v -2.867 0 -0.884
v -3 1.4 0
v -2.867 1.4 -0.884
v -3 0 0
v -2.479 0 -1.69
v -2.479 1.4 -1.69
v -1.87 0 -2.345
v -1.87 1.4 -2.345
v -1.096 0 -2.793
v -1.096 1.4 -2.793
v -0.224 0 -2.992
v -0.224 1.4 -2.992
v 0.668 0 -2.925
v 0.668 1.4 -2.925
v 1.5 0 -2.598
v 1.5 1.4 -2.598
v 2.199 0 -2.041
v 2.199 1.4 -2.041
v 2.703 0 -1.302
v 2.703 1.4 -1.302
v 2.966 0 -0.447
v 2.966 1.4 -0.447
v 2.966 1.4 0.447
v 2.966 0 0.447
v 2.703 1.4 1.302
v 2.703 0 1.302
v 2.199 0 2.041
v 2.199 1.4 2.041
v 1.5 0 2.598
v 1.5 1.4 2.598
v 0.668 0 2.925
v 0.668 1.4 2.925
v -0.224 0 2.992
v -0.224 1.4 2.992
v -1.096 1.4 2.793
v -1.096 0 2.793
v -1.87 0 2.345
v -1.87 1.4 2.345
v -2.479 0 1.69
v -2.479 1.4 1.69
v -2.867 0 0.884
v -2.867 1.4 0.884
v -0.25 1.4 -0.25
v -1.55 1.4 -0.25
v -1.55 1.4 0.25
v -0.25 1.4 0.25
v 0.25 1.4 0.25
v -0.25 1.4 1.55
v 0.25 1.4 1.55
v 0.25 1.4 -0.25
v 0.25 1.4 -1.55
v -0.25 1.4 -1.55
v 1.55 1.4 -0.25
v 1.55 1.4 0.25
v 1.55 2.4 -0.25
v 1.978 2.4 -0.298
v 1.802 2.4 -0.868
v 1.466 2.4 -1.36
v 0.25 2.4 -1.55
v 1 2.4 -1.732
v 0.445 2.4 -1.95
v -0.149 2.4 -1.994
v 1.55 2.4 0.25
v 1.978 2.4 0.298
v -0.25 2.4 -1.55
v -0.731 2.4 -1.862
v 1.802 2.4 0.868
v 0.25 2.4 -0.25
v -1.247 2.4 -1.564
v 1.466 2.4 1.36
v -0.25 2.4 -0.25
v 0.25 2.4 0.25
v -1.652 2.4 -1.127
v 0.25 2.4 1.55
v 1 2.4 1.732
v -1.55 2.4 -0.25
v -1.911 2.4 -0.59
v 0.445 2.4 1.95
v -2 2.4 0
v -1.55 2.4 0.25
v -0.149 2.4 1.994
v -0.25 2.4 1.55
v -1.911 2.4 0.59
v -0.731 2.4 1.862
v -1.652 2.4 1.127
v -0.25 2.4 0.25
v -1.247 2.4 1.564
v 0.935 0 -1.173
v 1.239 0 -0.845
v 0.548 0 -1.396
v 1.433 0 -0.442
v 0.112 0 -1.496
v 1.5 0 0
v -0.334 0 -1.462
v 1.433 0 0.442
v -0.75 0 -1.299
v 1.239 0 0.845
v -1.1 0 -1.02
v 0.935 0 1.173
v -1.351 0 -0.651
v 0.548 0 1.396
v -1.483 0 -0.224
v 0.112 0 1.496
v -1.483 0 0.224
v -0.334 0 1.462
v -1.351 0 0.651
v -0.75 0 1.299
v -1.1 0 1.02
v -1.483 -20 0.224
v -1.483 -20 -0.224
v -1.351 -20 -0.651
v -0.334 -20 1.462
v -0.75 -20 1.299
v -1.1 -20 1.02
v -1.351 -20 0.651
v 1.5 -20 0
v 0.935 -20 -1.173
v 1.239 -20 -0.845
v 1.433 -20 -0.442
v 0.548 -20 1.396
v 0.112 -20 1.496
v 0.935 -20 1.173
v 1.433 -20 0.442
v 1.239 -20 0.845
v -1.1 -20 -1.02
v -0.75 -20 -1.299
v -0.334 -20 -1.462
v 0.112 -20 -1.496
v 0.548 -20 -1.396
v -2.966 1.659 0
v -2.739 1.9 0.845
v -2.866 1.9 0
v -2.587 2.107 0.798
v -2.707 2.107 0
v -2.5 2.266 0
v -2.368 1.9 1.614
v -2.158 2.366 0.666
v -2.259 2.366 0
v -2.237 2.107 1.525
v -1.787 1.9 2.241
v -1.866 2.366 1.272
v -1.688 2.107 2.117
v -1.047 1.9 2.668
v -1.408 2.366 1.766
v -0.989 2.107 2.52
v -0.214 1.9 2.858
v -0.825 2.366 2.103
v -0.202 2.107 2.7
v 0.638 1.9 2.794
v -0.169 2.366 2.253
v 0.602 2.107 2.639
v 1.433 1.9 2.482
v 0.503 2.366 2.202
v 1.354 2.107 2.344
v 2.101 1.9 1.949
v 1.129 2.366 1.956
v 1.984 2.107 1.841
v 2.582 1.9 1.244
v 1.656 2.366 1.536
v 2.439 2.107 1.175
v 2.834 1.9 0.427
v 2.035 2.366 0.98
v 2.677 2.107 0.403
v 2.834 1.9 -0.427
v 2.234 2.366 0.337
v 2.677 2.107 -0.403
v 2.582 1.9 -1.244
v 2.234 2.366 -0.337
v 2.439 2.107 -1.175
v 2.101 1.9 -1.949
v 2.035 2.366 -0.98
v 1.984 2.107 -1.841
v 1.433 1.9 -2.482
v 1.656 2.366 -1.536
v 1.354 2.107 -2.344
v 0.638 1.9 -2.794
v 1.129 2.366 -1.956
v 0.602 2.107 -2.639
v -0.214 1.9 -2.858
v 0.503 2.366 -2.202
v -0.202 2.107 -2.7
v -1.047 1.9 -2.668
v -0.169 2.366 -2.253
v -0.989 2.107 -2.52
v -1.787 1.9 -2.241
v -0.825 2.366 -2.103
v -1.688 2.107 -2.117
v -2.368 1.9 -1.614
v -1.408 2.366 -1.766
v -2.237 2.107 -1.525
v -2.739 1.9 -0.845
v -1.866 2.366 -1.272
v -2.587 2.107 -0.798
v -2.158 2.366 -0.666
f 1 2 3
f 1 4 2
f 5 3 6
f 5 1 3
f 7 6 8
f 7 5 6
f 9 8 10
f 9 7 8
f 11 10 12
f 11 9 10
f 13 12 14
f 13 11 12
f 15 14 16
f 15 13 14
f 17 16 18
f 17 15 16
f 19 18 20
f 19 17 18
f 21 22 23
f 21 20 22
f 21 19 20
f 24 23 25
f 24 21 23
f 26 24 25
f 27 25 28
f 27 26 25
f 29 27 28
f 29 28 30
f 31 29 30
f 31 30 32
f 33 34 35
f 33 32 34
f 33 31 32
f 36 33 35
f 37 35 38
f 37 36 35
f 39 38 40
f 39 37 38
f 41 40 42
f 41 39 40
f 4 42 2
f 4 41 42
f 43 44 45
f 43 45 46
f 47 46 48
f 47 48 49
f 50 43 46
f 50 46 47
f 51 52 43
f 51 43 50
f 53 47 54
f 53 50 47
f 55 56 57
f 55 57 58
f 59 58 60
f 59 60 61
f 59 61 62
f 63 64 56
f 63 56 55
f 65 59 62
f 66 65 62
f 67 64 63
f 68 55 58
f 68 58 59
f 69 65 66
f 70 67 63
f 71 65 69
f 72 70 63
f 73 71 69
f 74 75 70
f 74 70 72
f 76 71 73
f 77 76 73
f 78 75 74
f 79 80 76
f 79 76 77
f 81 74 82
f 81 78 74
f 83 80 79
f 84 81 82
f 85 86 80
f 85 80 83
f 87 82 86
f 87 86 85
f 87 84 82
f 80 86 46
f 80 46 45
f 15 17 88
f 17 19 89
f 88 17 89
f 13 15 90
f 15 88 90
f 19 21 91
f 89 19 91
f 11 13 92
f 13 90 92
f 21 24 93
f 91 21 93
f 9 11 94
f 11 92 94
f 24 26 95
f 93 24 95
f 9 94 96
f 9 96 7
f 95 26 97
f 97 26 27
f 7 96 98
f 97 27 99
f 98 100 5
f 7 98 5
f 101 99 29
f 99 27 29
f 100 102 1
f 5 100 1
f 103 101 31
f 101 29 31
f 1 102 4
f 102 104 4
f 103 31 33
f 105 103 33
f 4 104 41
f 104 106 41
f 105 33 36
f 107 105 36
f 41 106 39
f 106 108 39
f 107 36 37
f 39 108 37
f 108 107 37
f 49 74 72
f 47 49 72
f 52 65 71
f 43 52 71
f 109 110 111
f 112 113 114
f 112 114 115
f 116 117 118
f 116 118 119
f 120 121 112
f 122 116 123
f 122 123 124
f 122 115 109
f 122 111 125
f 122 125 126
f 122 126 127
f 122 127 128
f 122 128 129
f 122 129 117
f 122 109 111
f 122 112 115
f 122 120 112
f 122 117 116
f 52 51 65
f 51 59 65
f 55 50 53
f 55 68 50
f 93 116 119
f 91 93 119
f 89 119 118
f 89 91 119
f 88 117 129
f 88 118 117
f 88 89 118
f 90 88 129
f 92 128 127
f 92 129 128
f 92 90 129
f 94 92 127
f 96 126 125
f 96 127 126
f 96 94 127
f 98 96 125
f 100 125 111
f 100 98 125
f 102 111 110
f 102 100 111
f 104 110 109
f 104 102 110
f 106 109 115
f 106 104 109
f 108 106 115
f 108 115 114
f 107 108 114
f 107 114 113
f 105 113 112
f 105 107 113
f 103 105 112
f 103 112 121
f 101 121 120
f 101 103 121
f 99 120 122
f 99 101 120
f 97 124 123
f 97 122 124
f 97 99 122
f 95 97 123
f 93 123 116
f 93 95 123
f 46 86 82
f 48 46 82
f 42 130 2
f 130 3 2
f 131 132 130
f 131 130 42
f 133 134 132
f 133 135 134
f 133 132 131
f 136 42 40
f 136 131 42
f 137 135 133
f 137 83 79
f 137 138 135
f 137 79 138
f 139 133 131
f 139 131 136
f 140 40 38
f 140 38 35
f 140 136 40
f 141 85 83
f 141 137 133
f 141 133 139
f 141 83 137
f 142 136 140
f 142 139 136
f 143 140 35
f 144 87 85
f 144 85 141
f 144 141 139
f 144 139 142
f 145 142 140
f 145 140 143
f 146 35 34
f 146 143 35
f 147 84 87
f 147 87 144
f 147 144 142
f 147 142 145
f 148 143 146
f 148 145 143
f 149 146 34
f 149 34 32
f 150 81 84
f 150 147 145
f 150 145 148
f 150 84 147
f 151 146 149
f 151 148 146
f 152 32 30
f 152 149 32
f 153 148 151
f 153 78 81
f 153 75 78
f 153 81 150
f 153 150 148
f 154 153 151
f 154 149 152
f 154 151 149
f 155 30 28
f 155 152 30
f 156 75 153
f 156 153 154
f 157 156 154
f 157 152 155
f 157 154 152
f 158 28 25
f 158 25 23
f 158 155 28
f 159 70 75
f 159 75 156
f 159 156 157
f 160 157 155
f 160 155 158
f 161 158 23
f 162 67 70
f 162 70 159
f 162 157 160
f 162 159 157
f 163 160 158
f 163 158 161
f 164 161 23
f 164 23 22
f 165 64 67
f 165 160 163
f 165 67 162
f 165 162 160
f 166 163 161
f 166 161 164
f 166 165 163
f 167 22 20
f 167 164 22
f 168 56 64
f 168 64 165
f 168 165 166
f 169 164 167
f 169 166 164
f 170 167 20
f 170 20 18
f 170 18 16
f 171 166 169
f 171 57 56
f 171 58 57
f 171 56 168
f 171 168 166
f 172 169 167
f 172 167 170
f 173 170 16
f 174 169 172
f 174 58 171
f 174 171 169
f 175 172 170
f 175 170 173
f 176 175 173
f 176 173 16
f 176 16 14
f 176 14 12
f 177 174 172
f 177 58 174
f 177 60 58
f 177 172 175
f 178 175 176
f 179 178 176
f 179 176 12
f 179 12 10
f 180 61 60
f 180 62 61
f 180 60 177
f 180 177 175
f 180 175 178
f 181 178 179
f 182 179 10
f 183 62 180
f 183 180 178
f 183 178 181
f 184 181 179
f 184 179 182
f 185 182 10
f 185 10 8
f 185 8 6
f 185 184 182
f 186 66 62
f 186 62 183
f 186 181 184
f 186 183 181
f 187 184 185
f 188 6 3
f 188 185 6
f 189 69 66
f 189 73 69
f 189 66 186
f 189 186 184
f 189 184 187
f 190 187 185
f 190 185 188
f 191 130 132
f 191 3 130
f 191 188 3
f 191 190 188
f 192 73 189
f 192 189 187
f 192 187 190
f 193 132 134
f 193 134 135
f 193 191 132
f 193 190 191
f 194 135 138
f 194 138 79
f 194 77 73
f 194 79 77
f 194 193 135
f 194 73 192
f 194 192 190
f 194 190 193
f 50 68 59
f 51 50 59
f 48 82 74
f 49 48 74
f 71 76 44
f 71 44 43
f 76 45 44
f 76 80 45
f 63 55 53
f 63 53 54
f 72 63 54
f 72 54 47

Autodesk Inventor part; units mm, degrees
ref_plane "YZ Plane" through (0, 0, 0) normal (1, 0, 0) x (0, 1, 0)
ref_plane "XZ Plane" through (0, 0, 0) normal (0, 1, 0) x (-1, 0, 0)
ref_plane "XY Plane" through (0, 0, 0) normal (0, 0, 1) x (1, 0, 0)
sketch "Sketch1" plane through (0, 0, 0) normal (0, 1, 0) x (-1, 0, 0)
  circle A0 centre (0, 0) radius 3
  dimension "d0" = 6
extrude "Extrusion1" add sketch "Sketch1" along normal blind 2.4
sketch "Sketch2" plane through (0, 2.4, 0) normal (0, 1, 0) x (1, 0, 0)
  line L0 (-1.55, 0.25) -> (1.55, 0.25)
  line L1 (1.55, 0.25) -> (1.55, -0.25)
  line L2 (1.55, -0.25) -> (-1.55, -0.25)
  line L3 (-1.55, -0.25) -> (-1.55, 0.25)
  line L4 (-0.25, -1.55) -> (0.25, -1.55)
  line L5 (0.25, -1.55) -> (0.25, 1.55)
  line L6 (0.25, 1.55) -> (-0.25, 1.55)
  line L7 (-0.25, 1.55) -> (-0.25, -1.55)
  point P0 (0, 0)
  dimension "d5" = 3.1
  dimension "d6" = 0.5
  dimension "d9" = 0.5
  dimension "d10" = 3.1
extrude "Extrusion2" cut sketch "Sketch2" against normal blind 1
fillet "Fillet1" radius 1 1 edges at (3, 2.4, 0)
sketch "Sketch3" plane through (0, 0, 0) normal (0, -1, 0) x (1, 0, 0)
  circle A0 centre (0, 0) radius 1.5
  dimension "d14" = 3
extrude "Extrusion3" add sketch "Sketch3" along normal blind 20
thread "Thread1" size "M3x0.5" class "6g" standard "ANSI Metric M Profile" full length
properties part number "m3 20mm screw"
